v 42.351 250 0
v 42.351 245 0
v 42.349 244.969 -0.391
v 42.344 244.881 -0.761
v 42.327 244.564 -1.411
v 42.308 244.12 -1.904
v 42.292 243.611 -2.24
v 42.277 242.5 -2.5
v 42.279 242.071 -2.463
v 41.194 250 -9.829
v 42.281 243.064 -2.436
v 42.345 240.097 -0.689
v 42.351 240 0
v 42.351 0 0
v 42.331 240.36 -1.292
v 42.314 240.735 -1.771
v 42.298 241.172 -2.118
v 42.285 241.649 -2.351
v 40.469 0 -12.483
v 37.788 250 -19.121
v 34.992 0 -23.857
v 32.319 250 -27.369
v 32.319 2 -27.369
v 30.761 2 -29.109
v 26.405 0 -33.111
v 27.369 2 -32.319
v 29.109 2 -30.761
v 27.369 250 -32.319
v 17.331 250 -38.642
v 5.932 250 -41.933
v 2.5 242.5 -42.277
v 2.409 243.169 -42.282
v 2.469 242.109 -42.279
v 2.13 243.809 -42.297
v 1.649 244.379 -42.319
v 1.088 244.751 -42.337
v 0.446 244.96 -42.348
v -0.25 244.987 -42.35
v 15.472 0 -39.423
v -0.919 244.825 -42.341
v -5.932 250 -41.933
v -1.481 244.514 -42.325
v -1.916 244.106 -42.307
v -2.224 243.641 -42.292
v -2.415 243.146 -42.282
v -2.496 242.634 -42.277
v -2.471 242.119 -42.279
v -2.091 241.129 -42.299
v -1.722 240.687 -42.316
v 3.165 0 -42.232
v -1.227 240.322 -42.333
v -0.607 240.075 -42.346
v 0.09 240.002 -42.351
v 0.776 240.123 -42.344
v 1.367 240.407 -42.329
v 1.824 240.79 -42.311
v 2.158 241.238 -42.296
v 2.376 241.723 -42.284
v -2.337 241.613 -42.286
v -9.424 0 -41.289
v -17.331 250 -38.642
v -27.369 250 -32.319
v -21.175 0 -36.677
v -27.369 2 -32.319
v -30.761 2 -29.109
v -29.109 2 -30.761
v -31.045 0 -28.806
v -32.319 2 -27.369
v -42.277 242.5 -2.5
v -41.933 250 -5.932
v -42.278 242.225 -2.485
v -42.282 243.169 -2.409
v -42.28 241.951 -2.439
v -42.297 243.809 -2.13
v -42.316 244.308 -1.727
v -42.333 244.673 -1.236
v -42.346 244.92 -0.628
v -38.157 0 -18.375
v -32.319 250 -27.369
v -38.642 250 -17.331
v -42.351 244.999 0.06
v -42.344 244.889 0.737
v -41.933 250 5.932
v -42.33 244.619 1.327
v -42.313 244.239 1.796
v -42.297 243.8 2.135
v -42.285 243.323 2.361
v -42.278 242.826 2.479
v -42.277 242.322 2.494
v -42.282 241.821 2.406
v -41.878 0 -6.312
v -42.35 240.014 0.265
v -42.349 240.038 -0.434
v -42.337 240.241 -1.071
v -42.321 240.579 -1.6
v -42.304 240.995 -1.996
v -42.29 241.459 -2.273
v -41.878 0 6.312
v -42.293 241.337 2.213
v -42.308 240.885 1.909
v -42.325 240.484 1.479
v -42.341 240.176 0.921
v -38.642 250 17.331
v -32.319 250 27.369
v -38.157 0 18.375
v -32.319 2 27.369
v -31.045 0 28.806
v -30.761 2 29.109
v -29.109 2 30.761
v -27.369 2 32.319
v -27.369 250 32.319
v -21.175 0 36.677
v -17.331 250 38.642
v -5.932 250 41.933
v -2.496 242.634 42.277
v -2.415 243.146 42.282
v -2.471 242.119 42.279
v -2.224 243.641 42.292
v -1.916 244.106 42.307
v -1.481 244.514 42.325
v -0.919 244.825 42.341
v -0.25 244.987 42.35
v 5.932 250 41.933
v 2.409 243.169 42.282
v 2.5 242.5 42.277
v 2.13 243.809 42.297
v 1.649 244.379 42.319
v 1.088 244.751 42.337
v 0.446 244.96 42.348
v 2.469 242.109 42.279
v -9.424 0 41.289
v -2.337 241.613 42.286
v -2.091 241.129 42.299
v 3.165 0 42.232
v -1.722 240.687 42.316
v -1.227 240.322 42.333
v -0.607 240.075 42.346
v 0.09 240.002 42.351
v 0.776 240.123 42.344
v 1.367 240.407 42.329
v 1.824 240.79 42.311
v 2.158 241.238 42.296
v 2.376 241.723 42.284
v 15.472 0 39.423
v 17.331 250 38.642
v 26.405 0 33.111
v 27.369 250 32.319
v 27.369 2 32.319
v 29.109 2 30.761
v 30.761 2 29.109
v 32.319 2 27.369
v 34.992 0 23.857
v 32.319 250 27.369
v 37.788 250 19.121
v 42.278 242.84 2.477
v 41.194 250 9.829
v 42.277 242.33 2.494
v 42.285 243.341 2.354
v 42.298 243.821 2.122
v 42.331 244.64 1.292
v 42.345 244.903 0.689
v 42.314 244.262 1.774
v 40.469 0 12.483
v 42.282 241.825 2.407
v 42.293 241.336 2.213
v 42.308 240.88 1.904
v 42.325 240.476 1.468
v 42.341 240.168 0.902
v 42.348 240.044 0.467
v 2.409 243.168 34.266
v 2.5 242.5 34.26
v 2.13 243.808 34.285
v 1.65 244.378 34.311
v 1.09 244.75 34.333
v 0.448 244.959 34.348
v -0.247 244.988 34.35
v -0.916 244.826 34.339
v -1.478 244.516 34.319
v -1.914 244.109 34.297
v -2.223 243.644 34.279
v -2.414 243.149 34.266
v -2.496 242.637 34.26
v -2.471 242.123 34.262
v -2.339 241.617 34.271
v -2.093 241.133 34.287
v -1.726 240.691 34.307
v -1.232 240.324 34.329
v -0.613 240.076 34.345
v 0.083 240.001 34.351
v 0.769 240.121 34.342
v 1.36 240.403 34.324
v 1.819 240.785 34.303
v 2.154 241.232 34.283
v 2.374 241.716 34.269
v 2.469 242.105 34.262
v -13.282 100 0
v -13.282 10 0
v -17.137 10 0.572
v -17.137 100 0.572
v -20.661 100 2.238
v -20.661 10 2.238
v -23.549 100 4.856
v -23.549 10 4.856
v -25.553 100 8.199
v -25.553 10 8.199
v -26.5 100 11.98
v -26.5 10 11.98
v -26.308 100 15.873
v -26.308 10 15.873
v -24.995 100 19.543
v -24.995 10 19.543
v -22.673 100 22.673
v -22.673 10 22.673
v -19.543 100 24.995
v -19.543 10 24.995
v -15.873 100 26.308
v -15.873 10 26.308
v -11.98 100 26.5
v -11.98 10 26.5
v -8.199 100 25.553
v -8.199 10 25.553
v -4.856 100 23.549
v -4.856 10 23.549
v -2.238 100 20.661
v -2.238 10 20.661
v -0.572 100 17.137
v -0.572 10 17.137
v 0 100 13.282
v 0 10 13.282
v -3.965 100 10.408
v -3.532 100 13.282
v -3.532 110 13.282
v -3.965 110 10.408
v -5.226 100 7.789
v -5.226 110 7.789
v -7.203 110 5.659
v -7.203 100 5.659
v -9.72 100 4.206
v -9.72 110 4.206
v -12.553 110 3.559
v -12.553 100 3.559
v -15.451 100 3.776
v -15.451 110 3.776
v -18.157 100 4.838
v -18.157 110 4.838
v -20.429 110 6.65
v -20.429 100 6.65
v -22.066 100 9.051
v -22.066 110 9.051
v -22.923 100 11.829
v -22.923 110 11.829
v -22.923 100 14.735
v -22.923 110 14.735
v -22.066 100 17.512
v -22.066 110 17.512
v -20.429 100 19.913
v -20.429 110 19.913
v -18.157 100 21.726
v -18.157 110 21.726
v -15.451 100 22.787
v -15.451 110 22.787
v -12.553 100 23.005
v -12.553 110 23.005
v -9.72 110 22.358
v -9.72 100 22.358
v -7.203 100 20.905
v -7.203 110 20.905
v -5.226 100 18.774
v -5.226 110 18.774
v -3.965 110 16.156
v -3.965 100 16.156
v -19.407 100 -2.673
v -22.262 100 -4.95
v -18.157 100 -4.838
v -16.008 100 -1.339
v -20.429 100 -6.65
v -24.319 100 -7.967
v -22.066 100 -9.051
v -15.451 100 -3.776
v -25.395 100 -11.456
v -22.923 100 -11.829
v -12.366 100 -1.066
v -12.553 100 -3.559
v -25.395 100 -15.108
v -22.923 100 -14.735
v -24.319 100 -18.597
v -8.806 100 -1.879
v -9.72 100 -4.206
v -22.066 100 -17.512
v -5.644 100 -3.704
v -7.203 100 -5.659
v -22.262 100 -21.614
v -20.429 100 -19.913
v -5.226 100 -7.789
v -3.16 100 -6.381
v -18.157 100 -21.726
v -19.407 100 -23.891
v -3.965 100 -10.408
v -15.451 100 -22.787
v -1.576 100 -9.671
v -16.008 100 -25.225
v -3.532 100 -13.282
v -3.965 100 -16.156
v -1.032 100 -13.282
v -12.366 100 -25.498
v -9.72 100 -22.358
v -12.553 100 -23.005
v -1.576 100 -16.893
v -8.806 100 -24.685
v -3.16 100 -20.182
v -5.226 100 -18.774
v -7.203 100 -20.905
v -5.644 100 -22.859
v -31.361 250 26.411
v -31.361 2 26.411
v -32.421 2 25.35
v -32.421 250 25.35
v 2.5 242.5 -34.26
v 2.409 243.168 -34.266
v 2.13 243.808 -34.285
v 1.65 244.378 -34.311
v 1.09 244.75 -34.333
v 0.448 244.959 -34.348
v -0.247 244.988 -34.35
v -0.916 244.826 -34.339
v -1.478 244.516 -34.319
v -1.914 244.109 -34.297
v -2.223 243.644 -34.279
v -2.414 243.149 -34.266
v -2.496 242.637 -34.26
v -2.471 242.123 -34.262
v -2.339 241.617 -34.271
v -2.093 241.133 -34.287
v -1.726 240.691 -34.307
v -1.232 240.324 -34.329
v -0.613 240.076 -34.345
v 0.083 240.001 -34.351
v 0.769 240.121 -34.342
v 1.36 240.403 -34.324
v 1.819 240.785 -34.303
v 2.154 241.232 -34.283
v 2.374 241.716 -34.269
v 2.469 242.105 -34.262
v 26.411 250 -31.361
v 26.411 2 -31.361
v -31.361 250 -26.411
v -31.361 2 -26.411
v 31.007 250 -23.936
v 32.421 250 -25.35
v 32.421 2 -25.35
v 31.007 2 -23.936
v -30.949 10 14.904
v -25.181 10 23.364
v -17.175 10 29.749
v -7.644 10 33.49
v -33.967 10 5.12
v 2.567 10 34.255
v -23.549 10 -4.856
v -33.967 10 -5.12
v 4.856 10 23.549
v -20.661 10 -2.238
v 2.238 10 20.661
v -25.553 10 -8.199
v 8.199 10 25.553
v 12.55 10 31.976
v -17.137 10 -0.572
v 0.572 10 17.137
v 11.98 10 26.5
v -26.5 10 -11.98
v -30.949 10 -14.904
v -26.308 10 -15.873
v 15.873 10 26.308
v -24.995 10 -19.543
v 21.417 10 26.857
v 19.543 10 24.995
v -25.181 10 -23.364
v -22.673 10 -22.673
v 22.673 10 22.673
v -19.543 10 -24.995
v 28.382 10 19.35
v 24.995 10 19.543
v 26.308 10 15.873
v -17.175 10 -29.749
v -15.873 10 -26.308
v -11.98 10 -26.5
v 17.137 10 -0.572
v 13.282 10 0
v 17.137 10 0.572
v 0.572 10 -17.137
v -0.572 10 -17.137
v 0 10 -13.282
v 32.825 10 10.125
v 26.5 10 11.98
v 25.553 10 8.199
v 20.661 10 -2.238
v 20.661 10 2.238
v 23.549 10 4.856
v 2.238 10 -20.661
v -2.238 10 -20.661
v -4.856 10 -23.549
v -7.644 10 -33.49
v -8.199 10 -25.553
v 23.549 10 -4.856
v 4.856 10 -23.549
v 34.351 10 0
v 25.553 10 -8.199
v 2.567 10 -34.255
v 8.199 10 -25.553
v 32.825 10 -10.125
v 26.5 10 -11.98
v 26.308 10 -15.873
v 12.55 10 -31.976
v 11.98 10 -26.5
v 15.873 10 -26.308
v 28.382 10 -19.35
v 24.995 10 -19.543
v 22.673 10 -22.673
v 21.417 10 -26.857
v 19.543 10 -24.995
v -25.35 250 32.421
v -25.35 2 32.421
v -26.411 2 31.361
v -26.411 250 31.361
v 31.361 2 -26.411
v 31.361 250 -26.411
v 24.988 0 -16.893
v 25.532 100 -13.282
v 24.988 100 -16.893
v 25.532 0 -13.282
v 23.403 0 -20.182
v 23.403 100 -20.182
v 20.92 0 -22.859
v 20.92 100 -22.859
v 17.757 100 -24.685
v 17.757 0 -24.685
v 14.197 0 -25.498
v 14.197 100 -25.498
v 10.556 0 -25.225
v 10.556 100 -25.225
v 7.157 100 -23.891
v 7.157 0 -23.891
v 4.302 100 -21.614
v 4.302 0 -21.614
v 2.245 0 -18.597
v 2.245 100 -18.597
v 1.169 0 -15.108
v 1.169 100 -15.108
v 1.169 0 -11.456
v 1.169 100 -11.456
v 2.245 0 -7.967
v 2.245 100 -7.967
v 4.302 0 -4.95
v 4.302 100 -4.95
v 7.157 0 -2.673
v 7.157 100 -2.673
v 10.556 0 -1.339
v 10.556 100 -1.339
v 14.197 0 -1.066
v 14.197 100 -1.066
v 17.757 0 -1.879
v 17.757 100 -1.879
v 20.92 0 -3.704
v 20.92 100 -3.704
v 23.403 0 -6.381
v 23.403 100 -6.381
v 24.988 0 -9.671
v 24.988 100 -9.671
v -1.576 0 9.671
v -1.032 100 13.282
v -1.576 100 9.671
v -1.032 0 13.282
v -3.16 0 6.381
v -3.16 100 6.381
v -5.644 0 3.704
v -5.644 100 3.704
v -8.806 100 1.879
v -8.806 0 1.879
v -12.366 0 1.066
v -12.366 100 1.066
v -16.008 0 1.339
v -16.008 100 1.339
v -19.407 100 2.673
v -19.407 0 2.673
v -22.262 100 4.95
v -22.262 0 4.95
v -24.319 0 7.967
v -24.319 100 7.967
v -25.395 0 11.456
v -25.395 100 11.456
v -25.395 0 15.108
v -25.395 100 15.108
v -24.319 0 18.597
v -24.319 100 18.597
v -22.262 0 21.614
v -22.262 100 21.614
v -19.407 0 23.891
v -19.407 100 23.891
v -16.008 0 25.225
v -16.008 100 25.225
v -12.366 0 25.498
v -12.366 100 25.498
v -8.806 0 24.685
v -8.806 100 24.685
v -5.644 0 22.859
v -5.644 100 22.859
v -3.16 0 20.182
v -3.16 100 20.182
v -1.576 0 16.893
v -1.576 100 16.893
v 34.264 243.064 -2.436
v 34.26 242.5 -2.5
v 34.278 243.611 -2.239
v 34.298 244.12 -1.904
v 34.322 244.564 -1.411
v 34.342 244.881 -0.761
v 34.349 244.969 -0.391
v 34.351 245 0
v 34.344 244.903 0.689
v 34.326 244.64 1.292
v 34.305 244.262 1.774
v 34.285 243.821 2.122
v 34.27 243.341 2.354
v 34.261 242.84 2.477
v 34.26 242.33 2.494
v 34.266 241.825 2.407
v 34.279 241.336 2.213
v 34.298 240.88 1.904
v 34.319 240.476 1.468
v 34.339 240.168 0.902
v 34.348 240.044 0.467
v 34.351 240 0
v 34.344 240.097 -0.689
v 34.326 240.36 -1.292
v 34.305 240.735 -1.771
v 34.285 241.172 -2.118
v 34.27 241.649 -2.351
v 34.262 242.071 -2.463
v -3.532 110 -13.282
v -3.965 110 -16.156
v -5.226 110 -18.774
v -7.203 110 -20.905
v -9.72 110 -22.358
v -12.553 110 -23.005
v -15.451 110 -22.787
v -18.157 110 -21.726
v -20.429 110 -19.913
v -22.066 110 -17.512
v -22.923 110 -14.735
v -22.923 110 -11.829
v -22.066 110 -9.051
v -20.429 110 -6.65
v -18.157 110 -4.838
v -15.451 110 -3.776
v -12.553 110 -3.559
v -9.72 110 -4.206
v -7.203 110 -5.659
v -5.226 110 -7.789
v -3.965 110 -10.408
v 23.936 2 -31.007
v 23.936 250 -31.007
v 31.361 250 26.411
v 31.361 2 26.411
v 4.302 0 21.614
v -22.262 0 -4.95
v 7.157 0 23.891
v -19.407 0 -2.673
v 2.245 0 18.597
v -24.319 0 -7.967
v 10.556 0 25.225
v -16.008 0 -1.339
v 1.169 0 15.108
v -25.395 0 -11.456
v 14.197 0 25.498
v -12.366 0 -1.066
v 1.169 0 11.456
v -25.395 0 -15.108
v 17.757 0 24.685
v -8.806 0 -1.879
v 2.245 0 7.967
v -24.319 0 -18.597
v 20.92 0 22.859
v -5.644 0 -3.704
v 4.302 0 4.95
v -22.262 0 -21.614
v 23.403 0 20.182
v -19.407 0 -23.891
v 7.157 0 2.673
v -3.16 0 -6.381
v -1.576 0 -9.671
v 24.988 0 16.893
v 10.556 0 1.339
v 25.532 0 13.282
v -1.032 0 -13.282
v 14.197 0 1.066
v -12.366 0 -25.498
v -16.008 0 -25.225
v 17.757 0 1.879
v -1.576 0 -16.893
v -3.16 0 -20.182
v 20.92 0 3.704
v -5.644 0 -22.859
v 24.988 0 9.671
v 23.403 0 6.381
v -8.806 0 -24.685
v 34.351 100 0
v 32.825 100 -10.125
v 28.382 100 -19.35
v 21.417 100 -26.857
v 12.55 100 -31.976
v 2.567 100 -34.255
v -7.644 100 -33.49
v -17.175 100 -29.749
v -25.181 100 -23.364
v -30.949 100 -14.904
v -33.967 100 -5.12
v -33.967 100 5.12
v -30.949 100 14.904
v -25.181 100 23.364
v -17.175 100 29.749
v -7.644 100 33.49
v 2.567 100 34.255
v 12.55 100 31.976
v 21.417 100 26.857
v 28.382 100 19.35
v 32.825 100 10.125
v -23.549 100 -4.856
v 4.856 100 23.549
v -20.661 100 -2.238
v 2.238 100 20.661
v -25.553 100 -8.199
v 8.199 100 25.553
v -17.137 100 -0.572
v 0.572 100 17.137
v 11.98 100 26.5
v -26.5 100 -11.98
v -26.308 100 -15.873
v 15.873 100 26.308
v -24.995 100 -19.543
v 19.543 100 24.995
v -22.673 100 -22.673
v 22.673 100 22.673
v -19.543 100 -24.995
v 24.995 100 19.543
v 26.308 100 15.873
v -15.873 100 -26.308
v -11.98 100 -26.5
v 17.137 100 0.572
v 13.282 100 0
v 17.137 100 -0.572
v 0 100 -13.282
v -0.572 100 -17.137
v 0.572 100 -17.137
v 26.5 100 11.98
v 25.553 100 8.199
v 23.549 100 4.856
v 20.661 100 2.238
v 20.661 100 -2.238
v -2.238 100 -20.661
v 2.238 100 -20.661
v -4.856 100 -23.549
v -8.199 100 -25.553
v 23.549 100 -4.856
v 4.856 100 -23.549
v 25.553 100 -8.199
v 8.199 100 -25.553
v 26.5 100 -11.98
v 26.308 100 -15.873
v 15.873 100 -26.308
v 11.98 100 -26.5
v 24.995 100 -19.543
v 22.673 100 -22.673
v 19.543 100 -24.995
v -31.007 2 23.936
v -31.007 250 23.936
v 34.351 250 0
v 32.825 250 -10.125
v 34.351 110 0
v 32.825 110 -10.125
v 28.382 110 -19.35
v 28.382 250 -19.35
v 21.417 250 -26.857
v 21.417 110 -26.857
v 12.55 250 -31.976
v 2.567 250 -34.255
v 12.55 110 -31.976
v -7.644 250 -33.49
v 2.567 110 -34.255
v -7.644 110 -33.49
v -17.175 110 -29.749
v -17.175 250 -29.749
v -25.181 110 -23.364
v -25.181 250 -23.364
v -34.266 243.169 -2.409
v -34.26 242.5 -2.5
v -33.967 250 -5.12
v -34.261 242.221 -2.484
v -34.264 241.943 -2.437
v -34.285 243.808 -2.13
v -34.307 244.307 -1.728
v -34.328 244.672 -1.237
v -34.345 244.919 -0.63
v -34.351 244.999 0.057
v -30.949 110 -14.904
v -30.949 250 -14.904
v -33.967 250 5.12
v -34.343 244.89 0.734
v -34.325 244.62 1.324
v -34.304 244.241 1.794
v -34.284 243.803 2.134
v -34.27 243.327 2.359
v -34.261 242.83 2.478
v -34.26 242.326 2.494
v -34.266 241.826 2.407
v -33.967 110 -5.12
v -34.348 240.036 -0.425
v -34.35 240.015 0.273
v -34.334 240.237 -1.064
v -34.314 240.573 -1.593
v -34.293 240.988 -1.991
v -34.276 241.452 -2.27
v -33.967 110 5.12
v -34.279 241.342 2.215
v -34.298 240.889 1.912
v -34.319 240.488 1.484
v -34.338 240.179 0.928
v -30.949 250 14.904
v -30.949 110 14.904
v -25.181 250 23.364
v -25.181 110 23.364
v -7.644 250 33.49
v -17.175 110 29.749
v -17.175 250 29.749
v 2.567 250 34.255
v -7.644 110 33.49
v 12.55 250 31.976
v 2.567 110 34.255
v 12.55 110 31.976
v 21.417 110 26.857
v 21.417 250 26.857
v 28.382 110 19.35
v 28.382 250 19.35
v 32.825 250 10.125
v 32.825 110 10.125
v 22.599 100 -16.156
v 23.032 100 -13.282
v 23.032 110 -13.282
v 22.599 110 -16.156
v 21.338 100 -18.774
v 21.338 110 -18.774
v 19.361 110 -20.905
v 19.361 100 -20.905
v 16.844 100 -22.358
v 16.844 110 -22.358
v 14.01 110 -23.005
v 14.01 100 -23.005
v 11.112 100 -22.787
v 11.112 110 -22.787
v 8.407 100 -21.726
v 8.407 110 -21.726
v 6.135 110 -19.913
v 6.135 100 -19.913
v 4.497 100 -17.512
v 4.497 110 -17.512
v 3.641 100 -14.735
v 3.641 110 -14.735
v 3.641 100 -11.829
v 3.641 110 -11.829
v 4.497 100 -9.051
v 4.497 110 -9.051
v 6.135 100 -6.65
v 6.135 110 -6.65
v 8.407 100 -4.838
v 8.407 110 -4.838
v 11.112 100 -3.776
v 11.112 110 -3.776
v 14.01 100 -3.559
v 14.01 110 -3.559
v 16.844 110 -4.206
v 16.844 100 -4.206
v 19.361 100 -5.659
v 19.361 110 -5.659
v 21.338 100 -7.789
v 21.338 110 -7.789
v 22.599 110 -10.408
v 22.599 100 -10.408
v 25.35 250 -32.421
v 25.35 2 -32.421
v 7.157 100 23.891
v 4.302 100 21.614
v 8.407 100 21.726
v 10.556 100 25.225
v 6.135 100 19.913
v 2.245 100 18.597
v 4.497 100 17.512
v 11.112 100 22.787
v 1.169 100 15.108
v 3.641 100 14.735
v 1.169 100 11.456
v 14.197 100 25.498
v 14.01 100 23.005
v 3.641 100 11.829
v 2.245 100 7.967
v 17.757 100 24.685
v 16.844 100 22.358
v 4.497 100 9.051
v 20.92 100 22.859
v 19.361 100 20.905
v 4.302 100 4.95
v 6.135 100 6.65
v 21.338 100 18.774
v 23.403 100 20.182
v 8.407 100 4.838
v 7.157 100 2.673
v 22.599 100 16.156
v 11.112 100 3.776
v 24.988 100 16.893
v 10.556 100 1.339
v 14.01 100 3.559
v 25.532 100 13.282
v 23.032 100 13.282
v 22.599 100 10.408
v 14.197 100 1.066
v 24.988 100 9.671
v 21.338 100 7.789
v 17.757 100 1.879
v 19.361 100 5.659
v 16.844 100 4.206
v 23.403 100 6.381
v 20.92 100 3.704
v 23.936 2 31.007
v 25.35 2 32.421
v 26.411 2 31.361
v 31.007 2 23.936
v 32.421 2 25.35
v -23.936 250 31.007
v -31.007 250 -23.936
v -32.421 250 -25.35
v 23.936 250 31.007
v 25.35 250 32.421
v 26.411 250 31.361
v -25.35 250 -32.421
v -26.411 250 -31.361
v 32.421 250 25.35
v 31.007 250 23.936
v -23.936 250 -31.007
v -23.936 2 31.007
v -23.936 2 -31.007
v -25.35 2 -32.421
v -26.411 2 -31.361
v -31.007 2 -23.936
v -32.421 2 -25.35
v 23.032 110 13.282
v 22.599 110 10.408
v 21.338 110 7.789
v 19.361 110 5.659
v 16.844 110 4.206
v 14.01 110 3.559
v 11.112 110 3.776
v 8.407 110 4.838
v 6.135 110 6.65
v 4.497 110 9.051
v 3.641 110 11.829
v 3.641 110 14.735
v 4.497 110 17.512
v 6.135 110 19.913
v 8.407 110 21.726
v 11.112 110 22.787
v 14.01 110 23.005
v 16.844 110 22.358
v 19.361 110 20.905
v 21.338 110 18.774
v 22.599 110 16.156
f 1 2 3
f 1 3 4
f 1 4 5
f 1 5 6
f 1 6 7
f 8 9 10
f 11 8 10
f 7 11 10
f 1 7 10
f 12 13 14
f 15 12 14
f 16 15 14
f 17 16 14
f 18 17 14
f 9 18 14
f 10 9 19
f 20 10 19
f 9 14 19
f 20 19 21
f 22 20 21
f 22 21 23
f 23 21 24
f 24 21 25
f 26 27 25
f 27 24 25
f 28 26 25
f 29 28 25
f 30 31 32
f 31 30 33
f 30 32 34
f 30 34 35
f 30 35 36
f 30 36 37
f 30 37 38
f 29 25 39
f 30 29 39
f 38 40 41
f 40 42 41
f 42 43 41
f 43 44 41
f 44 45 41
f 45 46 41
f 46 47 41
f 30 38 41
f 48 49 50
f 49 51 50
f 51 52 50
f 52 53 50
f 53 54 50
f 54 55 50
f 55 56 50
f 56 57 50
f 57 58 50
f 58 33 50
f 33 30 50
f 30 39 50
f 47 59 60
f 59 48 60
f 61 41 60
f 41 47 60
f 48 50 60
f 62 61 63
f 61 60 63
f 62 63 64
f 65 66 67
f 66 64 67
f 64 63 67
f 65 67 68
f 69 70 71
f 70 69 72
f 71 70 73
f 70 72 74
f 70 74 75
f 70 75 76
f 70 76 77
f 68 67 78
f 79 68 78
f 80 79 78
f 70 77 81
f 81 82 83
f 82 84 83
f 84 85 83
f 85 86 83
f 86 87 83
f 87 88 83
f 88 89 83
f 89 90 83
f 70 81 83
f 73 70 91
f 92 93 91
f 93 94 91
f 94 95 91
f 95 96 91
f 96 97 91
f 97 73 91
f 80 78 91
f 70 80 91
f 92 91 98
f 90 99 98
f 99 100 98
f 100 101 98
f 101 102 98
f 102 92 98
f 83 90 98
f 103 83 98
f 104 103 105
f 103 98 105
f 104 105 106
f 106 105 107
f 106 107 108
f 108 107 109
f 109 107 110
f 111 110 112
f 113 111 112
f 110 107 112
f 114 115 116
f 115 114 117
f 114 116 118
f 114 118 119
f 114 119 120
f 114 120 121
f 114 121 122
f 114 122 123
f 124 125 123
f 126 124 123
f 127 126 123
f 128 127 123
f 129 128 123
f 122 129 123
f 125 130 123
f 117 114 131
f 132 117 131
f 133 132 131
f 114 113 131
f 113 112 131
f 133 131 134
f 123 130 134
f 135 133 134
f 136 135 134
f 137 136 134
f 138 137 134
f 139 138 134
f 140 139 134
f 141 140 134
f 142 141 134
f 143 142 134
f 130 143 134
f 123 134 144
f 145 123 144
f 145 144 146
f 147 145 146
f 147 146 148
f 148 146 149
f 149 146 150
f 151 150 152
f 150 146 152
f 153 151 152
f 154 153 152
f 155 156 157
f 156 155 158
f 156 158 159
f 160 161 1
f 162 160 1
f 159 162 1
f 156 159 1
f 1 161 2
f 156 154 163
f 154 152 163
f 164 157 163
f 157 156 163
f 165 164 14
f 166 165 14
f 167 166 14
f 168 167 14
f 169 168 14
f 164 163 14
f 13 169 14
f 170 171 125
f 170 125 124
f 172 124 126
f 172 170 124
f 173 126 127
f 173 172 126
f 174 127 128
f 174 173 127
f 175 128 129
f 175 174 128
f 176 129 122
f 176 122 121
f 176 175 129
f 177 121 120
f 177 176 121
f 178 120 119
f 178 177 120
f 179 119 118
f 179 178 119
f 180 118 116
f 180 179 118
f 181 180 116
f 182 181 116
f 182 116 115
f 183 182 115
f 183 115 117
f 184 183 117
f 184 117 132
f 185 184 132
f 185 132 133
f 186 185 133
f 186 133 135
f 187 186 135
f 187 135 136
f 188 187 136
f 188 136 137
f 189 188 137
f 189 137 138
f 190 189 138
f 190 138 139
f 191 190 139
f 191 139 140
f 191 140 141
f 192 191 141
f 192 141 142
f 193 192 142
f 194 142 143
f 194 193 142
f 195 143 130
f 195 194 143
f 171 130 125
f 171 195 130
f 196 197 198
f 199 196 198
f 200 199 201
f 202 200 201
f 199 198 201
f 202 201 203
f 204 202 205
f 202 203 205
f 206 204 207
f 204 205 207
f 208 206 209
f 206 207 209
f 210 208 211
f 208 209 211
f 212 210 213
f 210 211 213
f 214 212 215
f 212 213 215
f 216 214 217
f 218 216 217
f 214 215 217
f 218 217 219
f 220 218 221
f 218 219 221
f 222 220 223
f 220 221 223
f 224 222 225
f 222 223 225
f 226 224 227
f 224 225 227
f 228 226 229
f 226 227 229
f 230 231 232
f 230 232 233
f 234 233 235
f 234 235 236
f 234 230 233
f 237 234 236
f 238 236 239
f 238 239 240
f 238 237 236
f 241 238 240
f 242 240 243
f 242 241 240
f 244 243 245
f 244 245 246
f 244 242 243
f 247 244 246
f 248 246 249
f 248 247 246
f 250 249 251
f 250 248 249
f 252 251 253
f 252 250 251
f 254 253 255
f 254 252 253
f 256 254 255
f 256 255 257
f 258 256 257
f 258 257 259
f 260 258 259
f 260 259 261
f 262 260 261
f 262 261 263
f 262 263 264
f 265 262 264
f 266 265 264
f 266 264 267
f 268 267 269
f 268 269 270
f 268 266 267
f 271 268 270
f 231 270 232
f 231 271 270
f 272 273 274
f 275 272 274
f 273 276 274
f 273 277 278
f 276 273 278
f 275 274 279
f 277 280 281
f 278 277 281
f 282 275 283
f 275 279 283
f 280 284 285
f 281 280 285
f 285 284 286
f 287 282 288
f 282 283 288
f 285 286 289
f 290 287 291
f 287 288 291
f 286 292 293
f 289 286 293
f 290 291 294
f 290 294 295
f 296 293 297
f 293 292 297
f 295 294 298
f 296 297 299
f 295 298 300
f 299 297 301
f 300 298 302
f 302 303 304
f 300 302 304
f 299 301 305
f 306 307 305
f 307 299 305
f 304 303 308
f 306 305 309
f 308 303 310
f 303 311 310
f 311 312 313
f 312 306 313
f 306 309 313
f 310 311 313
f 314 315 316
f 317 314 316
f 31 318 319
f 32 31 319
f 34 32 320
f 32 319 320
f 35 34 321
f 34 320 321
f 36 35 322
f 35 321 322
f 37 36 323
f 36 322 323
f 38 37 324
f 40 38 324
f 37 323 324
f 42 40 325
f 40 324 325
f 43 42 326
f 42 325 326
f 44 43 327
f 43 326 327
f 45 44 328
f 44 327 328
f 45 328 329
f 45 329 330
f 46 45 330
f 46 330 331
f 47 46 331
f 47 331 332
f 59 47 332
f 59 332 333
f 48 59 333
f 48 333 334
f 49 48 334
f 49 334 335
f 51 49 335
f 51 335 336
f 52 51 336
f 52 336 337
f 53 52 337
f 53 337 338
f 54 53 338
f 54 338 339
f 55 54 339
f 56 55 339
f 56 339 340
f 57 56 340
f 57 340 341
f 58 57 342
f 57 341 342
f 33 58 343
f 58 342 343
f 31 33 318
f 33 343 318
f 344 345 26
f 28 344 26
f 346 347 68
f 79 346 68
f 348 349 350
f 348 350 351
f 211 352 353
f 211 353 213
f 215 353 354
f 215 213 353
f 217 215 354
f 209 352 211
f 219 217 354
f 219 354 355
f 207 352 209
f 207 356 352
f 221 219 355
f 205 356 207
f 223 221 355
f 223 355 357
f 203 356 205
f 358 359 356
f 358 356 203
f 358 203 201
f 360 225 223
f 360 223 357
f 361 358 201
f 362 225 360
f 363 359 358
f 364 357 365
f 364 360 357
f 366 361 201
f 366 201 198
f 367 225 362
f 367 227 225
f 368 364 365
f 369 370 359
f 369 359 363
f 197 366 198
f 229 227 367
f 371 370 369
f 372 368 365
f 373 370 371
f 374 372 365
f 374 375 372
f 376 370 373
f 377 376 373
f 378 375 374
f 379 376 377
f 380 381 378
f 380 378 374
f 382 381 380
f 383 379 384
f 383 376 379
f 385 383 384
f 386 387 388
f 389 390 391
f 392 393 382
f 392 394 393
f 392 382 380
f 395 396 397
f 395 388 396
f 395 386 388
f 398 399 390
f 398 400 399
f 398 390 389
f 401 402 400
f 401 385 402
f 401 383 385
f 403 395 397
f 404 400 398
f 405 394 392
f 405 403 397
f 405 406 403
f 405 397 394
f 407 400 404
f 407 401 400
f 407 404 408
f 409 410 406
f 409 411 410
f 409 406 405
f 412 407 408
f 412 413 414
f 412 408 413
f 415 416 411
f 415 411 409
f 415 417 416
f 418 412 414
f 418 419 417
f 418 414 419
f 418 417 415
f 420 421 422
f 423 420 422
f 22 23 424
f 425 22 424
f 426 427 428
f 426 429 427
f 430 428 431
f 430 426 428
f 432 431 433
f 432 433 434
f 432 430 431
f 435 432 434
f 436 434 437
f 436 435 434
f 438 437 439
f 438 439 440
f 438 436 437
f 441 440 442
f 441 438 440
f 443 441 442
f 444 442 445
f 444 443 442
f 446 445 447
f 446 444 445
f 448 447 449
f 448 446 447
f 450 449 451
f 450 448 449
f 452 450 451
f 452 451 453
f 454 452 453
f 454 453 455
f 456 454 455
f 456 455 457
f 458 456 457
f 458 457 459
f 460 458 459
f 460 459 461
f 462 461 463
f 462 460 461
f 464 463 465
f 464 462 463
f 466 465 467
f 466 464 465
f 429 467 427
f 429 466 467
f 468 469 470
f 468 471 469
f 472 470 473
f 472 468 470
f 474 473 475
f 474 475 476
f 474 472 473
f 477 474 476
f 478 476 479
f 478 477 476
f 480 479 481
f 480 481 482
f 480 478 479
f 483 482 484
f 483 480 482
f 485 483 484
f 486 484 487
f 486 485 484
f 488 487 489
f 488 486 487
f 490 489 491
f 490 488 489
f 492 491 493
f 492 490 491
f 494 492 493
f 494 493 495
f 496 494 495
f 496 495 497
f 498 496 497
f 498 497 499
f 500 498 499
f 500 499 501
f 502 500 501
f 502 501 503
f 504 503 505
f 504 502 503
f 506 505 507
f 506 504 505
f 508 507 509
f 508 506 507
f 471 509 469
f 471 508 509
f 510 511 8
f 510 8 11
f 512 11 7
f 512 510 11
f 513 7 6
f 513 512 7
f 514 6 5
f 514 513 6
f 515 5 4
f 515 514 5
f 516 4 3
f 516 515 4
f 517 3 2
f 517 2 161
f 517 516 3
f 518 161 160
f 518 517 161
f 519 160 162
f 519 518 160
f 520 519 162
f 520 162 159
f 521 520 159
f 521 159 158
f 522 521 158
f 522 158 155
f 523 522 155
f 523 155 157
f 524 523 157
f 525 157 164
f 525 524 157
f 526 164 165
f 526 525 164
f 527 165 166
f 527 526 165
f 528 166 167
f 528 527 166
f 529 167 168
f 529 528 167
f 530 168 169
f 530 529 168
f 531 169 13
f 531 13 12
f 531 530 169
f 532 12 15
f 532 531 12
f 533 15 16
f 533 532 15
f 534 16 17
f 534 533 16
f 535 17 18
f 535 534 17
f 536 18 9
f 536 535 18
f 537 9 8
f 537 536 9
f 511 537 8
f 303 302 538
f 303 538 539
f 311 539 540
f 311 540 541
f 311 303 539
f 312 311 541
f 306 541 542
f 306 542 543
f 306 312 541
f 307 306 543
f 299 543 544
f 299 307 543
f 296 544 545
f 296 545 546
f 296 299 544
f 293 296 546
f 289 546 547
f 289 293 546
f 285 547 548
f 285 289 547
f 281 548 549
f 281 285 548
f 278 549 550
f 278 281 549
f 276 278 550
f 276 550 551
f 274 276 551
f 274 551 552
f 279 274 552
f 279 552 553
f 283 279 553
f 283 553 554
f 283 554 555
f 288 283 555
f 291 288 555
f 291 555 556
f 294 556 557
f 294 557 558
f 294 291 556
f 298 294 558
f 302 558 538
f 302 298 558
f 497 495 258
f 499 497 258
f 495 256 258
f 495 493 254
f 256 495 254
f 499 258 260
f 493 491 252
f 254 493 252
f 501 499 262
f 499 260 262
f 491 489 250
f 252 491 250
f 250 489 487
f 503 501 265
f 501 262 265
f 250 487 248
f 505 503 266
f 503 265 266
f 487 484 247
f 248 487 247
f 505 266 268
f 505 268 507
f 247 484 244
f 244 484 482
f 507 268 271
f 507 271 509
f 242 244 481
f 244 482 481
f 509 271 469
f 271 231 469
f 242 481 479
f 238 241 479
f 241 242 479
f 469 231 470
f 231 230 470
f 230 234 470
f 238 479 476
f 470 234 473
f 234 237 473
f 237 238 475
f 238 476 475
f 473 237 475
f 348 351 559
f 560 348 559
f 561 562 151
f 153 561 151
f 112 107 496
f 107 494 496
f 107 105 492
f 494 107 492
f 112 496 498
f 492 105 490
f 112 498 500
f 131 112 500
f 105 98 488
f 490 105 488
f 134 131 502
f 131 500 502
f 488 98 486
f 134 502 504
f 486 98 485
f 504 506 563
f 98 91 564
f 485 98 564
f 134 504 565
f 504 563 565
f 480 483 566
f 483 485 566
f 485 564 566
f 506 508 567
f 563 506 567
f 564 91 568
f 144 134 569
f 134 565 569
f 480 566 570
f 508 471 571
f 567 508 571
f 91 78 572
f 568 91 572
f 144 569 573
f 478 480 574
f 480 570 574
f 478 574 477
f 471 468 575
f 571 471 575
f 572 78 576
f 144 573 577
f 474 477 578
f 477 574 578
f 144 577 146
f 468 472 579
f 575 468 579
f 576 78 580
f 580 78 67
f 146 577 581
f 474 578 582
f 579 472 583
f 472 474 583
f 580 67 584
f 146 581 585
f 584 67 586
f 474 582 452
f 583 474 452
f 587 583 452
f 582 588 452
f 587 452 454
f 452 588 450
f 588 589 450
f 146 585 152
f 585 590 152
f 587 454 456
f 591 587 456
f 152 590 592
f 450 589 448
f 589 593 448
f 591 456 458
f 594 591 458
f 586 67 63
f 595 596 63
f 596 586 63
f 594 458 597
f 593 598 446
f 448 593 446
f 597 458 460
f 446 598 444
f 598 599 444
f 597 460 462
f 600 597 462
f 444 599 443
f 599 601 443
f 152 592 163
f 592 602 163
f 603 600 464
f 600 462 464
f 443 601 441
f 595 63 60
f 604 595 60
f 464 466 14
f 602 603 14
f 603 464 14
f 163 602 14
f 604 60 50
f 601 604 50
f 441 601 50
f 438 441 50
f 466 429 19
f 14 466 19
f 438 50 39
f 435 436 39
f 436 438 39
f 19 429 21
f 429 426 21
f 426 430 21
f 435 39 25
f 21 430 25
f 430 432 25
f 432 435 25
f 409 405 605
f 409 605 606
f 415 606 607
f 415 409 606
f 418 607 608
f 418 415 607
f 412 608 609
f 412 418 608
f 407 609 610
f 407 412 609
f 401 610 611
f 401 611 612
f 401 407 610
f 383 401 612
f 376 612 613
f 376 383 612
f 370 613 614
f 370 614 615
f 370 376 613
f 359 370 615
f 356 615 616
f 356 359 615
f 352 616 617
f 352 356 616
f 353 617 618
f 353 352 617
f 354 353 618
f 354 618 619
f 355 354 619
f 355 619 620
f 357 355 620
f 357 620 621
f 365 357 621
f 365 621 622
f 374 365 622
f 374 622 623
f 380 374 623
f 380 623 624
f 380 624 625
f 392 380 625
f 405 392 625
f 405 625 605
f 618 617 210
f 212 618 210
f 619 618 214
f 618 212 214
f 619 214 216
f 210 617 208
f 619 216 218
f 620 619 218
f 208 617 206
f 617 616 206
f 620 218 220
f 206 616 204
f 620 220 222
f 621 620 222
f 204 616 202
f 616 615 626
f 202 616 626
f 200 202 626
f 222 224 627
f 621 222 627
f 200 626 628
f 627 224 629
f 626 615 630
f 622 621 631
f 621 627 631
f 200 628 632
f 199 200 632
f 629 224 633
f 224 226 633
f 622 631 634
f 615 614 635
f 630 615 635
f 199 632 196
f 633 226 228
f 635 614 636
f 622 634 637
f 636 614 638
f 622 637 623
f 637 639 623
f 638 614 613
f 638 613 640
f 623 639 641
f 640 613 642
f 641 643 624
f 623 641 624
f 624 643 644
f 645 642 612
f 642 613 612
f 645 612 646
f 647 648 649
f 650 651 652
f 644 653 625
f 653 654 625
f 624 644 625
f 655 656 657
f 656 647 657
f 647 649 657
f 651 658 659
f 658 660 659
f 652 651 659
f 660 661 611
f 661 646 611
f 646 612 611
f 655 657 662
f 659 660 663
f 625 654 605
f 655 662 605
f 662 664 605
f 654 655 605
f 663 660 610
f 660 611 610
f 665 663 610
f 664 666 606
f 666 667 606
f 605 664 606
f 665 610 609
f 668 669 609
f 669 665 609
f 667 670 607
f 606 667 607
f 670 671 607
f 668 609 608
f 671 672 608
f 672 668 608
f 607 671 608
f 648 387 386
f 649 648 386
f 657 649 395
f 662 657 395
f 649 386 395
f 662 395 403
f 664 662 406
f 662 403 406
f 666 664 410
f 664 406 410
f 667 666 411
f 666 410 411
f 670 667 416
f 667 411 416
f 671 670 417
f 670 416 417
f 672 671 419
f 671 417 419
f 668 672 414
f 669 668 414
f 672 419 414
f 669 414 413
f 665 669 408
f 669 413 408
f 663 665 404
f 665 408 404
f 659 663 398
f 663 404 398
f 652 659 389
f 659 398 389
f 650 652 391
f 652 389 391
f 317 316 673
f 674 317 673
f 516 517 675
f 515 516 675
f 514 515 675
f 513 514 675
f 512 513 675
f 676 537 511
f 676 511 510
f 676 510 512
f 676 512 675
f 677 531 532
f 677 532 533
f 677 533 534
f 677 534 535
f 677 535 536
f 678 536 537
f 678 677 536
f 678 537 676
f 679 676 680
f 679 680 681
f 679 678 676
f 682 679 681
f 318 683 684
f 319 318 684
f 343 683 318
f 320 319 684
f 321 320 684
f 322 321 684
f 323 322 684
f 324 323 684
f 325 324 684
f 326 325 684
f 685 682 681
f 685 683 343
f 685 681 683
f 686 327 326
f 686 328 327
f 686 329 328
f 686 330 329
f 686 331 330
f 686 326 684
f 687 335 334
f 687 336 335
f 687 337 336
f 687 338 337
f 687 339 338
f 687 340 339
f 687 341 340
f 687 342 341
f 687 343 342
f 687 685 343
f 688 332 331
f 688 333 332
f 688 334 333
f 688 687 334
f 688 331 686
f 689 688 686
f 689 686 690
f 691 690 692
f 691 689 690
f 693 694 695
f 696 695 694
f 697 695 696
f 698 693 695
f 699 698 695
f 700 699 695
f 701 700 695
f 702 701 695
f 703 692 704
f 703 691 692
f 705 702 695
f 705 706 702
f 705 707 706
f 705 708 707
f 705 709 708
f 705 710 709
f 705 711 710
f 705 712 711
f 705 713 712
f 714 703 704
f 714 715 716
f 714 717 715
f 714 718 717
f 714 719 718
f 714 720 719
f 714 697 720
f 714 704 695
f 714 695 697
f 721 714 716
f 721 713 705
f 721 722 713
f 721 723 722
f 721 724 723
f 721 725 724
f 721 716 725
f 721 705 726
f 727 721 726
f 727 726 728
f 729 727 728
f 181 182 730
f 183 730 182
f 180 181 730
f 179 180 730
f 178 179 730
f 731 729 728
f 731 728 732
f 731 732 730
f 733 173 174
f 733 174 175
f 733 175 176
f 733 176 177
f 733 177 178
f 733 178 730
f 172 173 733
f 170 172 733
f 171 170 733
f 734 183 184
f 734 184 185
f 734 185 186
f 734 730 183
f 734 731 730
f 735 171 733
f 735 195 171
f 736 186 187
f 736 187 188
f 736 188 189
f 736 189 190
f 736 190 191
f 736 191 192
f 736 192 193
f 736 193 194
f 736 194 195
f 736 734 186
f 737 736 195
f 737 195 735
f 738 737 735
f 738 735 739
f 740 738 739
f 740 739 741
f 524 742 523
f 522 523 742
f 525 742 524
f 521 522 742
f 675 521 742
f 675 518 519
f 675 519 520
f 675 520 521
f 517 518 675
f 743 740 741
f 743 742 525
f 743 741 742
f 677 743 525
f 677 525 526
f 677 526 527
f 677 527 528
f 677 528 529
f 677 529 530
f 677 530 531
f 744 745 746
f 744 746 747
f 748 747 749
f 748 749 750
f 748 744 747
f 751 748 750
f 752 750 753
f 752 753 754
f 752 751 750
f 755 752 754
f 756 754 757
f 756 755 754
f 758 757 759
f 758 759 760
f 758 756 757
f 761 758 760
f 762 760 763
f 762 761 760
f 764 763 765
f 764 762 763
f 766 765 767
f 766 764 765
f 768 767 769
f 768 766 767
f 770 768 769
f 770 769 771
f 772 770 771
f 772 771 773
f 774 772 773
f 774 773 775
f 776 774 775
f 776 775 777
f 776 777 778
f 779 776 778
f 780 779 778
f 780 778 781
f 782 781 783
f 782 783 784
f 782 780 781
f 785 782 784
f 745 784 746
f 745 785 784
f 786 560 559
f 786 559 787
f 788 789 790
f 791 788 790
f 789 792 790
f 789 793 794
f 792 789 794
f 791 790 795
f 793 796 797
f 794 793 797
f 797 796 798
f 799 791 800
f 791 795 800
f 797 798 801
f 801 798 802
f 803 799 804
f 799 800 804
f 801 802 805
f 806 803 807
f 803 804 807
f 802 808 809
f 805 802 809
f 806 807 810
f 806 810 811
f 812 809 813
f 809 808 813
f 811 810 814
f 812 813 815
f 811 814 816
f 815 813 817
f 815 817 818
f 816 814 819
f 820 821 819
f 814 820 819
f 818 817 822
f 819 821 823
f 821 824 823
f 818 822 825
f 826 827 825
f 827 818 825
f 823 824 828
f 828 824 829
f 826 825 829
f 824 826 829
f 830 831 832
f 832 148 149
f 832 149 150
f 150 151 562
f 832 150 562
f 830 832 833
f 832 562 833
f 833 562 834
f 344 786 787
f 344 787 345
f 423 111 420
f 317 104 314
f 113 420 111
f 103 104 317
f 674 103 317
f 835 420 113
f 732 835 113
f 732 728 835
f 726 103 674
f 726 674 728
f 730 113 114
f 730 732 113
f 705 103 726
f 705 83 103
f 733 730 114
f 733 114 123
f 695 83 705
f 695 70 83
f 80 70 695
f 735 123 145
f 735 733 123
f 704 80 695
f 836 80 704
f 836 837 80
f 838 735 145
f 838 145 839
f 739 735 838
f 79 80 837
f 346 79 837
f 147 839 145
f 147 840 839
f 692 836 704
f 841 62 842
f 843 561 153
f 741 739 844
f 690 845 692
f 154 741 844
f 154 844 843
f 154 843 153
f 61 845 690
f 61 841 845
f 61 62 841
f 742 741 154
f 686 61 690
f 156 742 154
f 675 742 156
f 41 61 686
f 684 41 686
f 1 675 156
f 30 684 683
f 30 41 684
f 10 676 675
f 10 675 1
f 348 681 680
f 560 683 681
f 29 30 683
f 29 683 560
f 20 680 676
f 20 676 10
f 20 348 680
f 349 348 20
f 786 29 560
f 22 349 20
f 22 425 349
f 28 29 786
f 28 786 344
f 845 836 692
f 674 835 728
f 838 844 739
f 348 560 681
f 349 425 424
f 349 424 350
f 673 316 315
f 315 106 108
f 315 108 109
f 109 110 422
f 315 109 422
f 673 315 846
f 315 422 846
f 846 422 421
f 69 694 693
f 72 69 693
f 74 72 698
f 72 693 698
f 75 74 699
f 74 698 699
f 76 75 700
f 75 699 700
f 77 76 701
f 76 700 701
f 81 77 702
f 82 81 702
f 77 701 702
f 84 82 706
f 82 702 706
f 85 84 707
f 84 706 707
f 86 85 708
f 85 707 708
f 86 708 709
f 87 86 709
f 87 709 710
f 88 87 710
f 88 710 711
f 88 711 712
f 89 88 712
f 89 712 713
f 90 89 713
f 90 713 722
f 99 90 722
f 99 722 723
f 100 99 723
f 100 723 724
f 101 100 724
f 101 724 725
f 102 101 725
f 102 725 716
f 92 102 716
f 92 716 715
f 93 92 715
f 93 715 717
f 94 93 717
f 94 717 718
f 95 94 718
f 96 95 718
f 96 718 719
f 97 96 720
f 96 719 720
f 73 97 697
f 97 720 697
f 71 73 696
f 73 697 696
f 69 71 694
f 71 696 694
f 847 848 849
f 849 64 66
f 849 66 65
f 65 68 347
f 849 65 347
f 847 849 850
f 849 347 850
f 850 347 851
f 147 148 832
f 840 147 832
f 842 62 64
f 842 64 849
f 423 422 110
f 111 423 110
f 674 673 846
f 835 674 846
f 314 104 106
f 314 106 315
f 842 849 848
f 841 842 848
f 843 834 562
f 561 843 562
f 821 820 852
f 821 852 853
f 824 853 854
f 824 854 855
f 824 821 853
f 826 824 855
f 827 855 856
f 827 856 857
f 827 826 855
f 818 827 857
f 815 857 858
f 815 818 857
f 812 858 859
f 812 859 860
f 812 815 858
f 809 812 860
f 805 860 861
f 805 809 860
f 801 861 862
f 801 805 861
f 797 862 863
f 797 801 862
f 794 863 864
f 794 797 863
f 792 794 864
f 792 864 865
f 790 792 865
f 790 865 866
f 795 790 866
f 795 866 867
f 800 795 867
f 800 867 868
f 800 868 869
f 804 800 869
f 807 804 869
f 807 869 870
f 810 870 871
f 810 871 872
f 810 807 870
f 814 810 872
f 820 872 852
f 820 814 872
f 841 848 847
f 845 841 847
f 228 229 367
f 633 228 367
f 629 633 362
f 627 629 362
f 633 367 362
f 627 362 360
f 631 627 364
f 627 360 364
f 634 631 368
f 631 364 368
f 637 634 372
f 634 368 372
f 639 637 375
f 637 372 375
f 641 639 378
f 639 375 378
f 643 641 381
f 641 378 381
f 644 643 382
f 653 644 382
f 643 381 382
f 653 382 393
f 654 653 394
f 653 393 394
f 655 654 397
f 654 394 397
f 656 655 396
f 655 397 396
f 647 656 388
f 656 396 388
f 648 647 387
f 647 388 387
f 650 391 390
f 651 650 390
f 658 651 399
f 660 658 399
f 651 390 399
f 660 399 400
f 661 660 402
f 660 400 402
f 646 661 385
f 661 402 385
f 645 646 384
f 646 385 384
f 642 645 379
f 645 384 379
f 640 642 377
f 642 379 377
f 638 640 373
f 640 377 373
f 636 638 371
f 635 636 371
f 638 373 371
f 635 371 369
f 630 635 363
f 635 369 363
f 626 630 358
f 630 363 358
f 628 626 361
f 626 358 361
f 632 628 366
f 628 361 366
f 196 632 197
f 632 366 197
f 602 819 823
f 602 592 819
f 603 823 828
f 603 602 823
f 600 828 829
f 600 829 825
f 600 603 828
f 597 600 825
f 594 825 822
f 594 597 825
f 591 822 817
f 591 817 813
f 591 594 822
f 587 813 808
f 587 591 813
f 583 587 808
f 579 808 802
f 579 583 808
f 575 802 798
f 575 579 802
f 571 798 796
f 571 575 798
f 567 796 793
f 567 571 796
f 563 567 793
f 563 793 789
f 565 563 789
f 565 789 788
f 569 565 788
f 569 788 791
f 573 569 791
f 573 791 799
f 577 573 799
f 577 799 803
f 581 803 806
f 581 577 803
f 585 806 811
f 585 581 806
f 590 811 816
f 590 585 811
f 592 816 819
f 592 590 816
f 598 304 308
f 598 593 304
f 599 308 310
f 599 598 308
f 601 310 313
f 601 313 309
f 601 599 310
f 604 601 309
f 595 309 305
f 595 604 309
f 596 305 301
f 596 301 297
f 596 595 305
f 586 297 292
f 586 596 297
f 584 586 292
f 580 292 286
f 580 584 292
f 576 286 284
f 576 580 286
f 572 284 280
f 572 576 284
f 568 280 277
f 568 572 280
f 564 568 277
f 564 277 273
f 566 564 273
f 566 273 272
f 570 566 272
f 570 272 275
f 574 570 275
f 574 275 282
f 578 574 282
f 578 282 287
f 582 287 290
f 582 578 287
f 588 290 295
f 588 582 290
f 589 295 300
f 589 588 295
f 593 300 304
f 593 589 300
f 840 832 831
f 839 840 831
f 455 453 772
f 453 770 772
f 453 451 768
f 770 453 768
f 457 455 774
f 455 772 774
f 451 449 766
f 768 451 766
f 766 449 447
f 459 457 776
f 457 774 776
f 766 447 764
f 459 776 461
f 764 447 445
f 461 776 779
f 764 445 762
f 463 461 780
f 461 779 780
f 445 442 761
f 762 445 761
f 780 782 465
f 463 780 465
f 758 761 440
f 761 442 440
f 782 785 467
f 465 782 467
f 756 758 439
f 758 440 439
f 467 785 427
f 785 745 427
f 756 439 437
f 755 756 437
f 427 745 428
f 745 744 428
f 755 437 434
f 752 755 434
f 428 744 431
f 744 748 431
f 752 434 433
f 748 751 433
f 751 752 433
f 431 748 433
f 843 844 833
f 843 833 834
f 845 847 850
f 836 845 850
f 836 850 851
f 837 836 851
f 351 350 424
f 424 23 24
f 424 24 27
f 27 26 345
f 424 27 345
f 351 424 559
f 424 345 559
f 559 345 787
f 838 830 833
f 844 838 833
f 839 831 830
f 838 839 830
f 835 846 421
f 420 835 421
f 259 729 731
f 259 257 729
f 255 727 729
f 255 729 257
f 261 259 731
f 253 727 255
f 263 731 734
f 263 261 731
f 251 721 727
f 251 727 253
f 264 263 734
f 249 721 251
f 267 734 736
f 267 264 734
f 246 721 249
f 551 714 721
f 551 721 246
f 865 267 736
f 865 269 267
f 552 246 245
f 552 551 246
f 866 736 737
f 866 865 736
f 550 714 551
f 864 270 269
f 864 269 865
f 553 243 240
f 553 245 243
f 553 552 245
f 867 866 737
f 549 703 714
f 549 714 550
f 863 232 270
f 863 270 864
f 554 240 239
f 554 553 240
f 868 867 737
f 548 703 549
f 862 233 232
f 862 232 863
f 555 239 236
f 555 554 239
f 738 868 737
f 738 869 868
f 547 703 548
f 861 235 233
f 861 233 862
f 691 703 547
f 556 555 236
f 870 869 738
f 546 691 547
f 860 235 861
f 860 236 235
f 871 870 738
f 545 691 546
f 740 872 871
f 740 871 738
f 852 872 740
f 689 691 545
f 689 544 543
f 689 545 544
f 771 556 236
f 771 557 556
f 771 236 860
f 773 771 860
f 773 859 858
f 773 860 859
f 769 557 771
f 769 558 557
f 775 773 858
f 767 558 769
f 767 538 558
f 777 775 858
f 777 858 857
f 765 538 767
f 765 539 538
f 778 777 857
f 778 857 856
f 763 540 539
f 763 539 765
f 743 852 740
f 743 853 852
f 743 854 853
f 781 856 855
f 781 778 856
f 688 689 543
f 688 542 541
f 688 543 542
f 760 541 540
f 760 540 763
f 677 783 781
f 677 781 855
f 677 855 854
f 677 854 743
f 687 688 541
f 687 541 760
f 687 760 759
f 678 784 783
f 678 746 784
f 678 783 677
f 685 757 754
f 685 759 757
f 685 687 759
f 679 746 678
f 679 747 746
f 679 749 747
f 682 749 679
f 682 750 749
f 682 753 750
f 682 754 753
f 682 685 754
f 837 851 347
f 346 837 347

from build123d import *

# Parameters (mm, degrees)
SKETCH1_R               = 42.350766569
SKETCH1_R_2             = 34.350766569
BOSS_EXTRUDE1_DEPTH     = 250
SKETCH2_R               = 2.5
CUT_EXTRUDE1_DEPTH      = 43.350766569
CUT_EXTRUDE1_DEPTH_BACK = 43.350766569
SKETCH3_R               = 2.5
CUT_EXTRUDE2_DEPTH      = 43.350766669
CUT_EXTRUDE2_DEPTH_BACK = 43.350766669
CUT_EXTRUDE3_DEPTH      = 249.0000001
CIRPATTERN1_COUNT       = 4
SKETCH6_R               = 34.350766569
SKETCH6_R_2             = 12.25
BOSS_EXTRUDE3_DEPTH     = 10
SKETCH8_R               = 12.25
BOSS_EXTRUDE6_DEPTH     = 90
SKETCH9_R               = 34.350766569
SKETCH9_R_2             = 9.75
BOSS_EXTRUDE7_DEPTH     = 10


with BuildPart() as part:
    # Sketch1 → Boss-Extrude1 (new body)
    with BuildSketch(Plane(origin=(0, 0, 0), x_dir=(1, 0, 0), z_dir=(0, 1, 0))):
        Circle(SKETCH1_R)
        Circle(SKETCH1_R_2, mode=Mode.SUBTRACT)
    extrude(amount=BOSS_EXTRUDE1_DEPTH)

    # Sketch2 → Cut-Extrude1 (cut, two sides)
    with BuildSketch(Plane(origin=(0, 0, 0), x_dir=(0, 0, -1), z_dir=(1, 0, 0))) as cut_extrude1_sk:
        with Locations((0, 242.5)):
            Circle(SKETCH2_R)
    extrude(amount=CUT_EXTRUDE1_DEPTH, mode=Mode.SUBTRACT)
    extrude(cut_extrude1_sk.sketch, amount=-CUT_EXTRUDE1_DEPTH_BACK, mode=Mode.SUBTRACT)

    # Sketch3 → Cut-Extrude2 (cut, two sides)
    with BuildSketch(Plane.XY) as cut_extrude2_sk:
        with Locations((0, 242.5)):
            Circle(SKETCH3_R)
    extrude(amount=CUT_EXTRUDE2_DEPTH, mode=Mode.SUBTRACT)
    extrude(cut_extrude2_sk.sketch, amount=-CUT_EXTRUDE2_DEPTH_BACK, mode=Mode.SUBTRACT)

    # Sketch4 → Cut-Extrude3 (cut, through all)
    with BuildSketch(Plane(origin=(0, 2, 0), x_dir=(1, 0, 0), z_dir=(0, 1, 0))):
        with BuildLine():
            Line((31.007174401, 23.936106589), (23.936106589, 31.007174401))
            Line((23.936106589, 31.007174401), (25.350320151, 32.421387963))
            Line((25.350320151, 32.421387963), (26.410980323, 31.360727791))
            Line((26.410980323, 31.360727791), (27.369199622, 32.31894709))
            ThreePointArc((27.369199622, 32.31894709), (29.946514229, 29.946514229), (32.31894709, 27.369199622))
            Line((32.31894709, 27.369199622), (31.360727791, 26.410980323))
            Line((31.360727791, 26.410980323), (32.421387963, 25.350320151))
            Line((32.421387963, 25.350320151), (31.007174401, 23.936106589))
        make_face()
    cut_extrude3 = extrude(amount=CUT_EXTRUDE3_DEPTH, mode=Mode.SUBTRACT)

    # CirPattern1: Cut-Extrude3 ×4 about axis
    cirpattern1_axis = Axis((0, 0, 0), (0, 1, 0))
    for i in range(1, CIRPATTERN1_COUNT):
        add(cut_extrude3.rotate(cirpattern1_axis, i * 360 / CIRPATTERN1_COUNT), mode=Mode.SUBTRACT)

    # Sketch6 → Boss-Extrude3 (add)
    with BuildSketch(Plane(origin=(0, 0, 0), x_dir=(1, 0, 0), z_dir=(0, 1, 0))):
        Circle(SKETCH6_R)
        with Locations((-13.281800184, 13.281800184)):
            Circle(SKETCH6_R_2, mode=Mode.SUBTRACT)
        with Locations((13.281800184, 13.281800184)):
            Circle(SKETCH6_R_2, mode=Mode.SUBTRACT)
        with Locations((13.281800184, -13.281800184)):
            Circle(SKETCH6_R_2, mode=Mode.SUBTRACT)
        with Locations((-13.281800184, -13.281800184)):
            Circle(SKETCH6_R_2, mode=Mode.SUBTRACT)
    extrude(amount=BOSS_EXTRUDE3_DEPTH)

    # Sketch8 → Boss-Extrude6 (add)
    with BuildSketch(Plane(origin=(0, 10, 0), x_dir=(1, 0, 0), z_dir=(0, 1, 0))):
        with BuildLine():
            ThreePointArc((0, 13.281800184), (-22.67345116, 22.67345116), (-13.281800184, 0))
            ThreePointArc((-13.281800184, 0), (-22.67345116, -22.67345116), (0, -13.281800184))
            ThreePointArc((0, -13.281800184), (22.67345116, -22.67345116), (13.281800184, 0))
            ThreePointArc((13.281800184, 0), (22.67345116, 22.67345116), (0, 13.281800184))
        make_face()
        with Locations((-13.281800184, -13.281800184)):
            Circle(SKETCH8_R, mode=Mode.SUBTRACT)
        with Locations((13.281800184, -13.281800184)):
            Circle(SKETCH8_R, mode=Mode.SUBTRACT)
        with Locations((13.281800184, 13.281800184)):
            Circle(SKETCH8_R, mode=Mode.SUBTRACT)
        with Locations((-13.281800184, 13.281800184)):
            Circle(SKETCH8_R, mode=Mode.SUBTRACT)
    extrude(amount=BOSS_EXTRUDE6_DEPTH)

    # Sketch9 → Boss-Extrude7 (add)
    with BuildSketch(Plane(origin=(0, 100, 0), x_dir=(1, 0, 0), z_dir=(0, 1, 0))):
        Circle(SKETCH9_R)
        with Locations((-13.281800184, 13.281800184)):
            Circle(SKETCH9_R_2, mode=Mode.SUBTRACT)
        with Locations((13.281800184, 13.281800184)):
            Circle(SKETCH9_R_2, mode=Mode.SUBTRACT)
        with Locations((13.281800184, -13.281800184)):
            Circle(SKETCH9_R_2, mode=Mode.SUBTRACT)
        with Locations((-13.281800184, -13.281800184)):
            Circle(SKETCH9_R_2, mode=Mode.SUBTRACT)
    extrude(amount=BOSS_EXTRUDE7_DEPTH)


solid = part.part
